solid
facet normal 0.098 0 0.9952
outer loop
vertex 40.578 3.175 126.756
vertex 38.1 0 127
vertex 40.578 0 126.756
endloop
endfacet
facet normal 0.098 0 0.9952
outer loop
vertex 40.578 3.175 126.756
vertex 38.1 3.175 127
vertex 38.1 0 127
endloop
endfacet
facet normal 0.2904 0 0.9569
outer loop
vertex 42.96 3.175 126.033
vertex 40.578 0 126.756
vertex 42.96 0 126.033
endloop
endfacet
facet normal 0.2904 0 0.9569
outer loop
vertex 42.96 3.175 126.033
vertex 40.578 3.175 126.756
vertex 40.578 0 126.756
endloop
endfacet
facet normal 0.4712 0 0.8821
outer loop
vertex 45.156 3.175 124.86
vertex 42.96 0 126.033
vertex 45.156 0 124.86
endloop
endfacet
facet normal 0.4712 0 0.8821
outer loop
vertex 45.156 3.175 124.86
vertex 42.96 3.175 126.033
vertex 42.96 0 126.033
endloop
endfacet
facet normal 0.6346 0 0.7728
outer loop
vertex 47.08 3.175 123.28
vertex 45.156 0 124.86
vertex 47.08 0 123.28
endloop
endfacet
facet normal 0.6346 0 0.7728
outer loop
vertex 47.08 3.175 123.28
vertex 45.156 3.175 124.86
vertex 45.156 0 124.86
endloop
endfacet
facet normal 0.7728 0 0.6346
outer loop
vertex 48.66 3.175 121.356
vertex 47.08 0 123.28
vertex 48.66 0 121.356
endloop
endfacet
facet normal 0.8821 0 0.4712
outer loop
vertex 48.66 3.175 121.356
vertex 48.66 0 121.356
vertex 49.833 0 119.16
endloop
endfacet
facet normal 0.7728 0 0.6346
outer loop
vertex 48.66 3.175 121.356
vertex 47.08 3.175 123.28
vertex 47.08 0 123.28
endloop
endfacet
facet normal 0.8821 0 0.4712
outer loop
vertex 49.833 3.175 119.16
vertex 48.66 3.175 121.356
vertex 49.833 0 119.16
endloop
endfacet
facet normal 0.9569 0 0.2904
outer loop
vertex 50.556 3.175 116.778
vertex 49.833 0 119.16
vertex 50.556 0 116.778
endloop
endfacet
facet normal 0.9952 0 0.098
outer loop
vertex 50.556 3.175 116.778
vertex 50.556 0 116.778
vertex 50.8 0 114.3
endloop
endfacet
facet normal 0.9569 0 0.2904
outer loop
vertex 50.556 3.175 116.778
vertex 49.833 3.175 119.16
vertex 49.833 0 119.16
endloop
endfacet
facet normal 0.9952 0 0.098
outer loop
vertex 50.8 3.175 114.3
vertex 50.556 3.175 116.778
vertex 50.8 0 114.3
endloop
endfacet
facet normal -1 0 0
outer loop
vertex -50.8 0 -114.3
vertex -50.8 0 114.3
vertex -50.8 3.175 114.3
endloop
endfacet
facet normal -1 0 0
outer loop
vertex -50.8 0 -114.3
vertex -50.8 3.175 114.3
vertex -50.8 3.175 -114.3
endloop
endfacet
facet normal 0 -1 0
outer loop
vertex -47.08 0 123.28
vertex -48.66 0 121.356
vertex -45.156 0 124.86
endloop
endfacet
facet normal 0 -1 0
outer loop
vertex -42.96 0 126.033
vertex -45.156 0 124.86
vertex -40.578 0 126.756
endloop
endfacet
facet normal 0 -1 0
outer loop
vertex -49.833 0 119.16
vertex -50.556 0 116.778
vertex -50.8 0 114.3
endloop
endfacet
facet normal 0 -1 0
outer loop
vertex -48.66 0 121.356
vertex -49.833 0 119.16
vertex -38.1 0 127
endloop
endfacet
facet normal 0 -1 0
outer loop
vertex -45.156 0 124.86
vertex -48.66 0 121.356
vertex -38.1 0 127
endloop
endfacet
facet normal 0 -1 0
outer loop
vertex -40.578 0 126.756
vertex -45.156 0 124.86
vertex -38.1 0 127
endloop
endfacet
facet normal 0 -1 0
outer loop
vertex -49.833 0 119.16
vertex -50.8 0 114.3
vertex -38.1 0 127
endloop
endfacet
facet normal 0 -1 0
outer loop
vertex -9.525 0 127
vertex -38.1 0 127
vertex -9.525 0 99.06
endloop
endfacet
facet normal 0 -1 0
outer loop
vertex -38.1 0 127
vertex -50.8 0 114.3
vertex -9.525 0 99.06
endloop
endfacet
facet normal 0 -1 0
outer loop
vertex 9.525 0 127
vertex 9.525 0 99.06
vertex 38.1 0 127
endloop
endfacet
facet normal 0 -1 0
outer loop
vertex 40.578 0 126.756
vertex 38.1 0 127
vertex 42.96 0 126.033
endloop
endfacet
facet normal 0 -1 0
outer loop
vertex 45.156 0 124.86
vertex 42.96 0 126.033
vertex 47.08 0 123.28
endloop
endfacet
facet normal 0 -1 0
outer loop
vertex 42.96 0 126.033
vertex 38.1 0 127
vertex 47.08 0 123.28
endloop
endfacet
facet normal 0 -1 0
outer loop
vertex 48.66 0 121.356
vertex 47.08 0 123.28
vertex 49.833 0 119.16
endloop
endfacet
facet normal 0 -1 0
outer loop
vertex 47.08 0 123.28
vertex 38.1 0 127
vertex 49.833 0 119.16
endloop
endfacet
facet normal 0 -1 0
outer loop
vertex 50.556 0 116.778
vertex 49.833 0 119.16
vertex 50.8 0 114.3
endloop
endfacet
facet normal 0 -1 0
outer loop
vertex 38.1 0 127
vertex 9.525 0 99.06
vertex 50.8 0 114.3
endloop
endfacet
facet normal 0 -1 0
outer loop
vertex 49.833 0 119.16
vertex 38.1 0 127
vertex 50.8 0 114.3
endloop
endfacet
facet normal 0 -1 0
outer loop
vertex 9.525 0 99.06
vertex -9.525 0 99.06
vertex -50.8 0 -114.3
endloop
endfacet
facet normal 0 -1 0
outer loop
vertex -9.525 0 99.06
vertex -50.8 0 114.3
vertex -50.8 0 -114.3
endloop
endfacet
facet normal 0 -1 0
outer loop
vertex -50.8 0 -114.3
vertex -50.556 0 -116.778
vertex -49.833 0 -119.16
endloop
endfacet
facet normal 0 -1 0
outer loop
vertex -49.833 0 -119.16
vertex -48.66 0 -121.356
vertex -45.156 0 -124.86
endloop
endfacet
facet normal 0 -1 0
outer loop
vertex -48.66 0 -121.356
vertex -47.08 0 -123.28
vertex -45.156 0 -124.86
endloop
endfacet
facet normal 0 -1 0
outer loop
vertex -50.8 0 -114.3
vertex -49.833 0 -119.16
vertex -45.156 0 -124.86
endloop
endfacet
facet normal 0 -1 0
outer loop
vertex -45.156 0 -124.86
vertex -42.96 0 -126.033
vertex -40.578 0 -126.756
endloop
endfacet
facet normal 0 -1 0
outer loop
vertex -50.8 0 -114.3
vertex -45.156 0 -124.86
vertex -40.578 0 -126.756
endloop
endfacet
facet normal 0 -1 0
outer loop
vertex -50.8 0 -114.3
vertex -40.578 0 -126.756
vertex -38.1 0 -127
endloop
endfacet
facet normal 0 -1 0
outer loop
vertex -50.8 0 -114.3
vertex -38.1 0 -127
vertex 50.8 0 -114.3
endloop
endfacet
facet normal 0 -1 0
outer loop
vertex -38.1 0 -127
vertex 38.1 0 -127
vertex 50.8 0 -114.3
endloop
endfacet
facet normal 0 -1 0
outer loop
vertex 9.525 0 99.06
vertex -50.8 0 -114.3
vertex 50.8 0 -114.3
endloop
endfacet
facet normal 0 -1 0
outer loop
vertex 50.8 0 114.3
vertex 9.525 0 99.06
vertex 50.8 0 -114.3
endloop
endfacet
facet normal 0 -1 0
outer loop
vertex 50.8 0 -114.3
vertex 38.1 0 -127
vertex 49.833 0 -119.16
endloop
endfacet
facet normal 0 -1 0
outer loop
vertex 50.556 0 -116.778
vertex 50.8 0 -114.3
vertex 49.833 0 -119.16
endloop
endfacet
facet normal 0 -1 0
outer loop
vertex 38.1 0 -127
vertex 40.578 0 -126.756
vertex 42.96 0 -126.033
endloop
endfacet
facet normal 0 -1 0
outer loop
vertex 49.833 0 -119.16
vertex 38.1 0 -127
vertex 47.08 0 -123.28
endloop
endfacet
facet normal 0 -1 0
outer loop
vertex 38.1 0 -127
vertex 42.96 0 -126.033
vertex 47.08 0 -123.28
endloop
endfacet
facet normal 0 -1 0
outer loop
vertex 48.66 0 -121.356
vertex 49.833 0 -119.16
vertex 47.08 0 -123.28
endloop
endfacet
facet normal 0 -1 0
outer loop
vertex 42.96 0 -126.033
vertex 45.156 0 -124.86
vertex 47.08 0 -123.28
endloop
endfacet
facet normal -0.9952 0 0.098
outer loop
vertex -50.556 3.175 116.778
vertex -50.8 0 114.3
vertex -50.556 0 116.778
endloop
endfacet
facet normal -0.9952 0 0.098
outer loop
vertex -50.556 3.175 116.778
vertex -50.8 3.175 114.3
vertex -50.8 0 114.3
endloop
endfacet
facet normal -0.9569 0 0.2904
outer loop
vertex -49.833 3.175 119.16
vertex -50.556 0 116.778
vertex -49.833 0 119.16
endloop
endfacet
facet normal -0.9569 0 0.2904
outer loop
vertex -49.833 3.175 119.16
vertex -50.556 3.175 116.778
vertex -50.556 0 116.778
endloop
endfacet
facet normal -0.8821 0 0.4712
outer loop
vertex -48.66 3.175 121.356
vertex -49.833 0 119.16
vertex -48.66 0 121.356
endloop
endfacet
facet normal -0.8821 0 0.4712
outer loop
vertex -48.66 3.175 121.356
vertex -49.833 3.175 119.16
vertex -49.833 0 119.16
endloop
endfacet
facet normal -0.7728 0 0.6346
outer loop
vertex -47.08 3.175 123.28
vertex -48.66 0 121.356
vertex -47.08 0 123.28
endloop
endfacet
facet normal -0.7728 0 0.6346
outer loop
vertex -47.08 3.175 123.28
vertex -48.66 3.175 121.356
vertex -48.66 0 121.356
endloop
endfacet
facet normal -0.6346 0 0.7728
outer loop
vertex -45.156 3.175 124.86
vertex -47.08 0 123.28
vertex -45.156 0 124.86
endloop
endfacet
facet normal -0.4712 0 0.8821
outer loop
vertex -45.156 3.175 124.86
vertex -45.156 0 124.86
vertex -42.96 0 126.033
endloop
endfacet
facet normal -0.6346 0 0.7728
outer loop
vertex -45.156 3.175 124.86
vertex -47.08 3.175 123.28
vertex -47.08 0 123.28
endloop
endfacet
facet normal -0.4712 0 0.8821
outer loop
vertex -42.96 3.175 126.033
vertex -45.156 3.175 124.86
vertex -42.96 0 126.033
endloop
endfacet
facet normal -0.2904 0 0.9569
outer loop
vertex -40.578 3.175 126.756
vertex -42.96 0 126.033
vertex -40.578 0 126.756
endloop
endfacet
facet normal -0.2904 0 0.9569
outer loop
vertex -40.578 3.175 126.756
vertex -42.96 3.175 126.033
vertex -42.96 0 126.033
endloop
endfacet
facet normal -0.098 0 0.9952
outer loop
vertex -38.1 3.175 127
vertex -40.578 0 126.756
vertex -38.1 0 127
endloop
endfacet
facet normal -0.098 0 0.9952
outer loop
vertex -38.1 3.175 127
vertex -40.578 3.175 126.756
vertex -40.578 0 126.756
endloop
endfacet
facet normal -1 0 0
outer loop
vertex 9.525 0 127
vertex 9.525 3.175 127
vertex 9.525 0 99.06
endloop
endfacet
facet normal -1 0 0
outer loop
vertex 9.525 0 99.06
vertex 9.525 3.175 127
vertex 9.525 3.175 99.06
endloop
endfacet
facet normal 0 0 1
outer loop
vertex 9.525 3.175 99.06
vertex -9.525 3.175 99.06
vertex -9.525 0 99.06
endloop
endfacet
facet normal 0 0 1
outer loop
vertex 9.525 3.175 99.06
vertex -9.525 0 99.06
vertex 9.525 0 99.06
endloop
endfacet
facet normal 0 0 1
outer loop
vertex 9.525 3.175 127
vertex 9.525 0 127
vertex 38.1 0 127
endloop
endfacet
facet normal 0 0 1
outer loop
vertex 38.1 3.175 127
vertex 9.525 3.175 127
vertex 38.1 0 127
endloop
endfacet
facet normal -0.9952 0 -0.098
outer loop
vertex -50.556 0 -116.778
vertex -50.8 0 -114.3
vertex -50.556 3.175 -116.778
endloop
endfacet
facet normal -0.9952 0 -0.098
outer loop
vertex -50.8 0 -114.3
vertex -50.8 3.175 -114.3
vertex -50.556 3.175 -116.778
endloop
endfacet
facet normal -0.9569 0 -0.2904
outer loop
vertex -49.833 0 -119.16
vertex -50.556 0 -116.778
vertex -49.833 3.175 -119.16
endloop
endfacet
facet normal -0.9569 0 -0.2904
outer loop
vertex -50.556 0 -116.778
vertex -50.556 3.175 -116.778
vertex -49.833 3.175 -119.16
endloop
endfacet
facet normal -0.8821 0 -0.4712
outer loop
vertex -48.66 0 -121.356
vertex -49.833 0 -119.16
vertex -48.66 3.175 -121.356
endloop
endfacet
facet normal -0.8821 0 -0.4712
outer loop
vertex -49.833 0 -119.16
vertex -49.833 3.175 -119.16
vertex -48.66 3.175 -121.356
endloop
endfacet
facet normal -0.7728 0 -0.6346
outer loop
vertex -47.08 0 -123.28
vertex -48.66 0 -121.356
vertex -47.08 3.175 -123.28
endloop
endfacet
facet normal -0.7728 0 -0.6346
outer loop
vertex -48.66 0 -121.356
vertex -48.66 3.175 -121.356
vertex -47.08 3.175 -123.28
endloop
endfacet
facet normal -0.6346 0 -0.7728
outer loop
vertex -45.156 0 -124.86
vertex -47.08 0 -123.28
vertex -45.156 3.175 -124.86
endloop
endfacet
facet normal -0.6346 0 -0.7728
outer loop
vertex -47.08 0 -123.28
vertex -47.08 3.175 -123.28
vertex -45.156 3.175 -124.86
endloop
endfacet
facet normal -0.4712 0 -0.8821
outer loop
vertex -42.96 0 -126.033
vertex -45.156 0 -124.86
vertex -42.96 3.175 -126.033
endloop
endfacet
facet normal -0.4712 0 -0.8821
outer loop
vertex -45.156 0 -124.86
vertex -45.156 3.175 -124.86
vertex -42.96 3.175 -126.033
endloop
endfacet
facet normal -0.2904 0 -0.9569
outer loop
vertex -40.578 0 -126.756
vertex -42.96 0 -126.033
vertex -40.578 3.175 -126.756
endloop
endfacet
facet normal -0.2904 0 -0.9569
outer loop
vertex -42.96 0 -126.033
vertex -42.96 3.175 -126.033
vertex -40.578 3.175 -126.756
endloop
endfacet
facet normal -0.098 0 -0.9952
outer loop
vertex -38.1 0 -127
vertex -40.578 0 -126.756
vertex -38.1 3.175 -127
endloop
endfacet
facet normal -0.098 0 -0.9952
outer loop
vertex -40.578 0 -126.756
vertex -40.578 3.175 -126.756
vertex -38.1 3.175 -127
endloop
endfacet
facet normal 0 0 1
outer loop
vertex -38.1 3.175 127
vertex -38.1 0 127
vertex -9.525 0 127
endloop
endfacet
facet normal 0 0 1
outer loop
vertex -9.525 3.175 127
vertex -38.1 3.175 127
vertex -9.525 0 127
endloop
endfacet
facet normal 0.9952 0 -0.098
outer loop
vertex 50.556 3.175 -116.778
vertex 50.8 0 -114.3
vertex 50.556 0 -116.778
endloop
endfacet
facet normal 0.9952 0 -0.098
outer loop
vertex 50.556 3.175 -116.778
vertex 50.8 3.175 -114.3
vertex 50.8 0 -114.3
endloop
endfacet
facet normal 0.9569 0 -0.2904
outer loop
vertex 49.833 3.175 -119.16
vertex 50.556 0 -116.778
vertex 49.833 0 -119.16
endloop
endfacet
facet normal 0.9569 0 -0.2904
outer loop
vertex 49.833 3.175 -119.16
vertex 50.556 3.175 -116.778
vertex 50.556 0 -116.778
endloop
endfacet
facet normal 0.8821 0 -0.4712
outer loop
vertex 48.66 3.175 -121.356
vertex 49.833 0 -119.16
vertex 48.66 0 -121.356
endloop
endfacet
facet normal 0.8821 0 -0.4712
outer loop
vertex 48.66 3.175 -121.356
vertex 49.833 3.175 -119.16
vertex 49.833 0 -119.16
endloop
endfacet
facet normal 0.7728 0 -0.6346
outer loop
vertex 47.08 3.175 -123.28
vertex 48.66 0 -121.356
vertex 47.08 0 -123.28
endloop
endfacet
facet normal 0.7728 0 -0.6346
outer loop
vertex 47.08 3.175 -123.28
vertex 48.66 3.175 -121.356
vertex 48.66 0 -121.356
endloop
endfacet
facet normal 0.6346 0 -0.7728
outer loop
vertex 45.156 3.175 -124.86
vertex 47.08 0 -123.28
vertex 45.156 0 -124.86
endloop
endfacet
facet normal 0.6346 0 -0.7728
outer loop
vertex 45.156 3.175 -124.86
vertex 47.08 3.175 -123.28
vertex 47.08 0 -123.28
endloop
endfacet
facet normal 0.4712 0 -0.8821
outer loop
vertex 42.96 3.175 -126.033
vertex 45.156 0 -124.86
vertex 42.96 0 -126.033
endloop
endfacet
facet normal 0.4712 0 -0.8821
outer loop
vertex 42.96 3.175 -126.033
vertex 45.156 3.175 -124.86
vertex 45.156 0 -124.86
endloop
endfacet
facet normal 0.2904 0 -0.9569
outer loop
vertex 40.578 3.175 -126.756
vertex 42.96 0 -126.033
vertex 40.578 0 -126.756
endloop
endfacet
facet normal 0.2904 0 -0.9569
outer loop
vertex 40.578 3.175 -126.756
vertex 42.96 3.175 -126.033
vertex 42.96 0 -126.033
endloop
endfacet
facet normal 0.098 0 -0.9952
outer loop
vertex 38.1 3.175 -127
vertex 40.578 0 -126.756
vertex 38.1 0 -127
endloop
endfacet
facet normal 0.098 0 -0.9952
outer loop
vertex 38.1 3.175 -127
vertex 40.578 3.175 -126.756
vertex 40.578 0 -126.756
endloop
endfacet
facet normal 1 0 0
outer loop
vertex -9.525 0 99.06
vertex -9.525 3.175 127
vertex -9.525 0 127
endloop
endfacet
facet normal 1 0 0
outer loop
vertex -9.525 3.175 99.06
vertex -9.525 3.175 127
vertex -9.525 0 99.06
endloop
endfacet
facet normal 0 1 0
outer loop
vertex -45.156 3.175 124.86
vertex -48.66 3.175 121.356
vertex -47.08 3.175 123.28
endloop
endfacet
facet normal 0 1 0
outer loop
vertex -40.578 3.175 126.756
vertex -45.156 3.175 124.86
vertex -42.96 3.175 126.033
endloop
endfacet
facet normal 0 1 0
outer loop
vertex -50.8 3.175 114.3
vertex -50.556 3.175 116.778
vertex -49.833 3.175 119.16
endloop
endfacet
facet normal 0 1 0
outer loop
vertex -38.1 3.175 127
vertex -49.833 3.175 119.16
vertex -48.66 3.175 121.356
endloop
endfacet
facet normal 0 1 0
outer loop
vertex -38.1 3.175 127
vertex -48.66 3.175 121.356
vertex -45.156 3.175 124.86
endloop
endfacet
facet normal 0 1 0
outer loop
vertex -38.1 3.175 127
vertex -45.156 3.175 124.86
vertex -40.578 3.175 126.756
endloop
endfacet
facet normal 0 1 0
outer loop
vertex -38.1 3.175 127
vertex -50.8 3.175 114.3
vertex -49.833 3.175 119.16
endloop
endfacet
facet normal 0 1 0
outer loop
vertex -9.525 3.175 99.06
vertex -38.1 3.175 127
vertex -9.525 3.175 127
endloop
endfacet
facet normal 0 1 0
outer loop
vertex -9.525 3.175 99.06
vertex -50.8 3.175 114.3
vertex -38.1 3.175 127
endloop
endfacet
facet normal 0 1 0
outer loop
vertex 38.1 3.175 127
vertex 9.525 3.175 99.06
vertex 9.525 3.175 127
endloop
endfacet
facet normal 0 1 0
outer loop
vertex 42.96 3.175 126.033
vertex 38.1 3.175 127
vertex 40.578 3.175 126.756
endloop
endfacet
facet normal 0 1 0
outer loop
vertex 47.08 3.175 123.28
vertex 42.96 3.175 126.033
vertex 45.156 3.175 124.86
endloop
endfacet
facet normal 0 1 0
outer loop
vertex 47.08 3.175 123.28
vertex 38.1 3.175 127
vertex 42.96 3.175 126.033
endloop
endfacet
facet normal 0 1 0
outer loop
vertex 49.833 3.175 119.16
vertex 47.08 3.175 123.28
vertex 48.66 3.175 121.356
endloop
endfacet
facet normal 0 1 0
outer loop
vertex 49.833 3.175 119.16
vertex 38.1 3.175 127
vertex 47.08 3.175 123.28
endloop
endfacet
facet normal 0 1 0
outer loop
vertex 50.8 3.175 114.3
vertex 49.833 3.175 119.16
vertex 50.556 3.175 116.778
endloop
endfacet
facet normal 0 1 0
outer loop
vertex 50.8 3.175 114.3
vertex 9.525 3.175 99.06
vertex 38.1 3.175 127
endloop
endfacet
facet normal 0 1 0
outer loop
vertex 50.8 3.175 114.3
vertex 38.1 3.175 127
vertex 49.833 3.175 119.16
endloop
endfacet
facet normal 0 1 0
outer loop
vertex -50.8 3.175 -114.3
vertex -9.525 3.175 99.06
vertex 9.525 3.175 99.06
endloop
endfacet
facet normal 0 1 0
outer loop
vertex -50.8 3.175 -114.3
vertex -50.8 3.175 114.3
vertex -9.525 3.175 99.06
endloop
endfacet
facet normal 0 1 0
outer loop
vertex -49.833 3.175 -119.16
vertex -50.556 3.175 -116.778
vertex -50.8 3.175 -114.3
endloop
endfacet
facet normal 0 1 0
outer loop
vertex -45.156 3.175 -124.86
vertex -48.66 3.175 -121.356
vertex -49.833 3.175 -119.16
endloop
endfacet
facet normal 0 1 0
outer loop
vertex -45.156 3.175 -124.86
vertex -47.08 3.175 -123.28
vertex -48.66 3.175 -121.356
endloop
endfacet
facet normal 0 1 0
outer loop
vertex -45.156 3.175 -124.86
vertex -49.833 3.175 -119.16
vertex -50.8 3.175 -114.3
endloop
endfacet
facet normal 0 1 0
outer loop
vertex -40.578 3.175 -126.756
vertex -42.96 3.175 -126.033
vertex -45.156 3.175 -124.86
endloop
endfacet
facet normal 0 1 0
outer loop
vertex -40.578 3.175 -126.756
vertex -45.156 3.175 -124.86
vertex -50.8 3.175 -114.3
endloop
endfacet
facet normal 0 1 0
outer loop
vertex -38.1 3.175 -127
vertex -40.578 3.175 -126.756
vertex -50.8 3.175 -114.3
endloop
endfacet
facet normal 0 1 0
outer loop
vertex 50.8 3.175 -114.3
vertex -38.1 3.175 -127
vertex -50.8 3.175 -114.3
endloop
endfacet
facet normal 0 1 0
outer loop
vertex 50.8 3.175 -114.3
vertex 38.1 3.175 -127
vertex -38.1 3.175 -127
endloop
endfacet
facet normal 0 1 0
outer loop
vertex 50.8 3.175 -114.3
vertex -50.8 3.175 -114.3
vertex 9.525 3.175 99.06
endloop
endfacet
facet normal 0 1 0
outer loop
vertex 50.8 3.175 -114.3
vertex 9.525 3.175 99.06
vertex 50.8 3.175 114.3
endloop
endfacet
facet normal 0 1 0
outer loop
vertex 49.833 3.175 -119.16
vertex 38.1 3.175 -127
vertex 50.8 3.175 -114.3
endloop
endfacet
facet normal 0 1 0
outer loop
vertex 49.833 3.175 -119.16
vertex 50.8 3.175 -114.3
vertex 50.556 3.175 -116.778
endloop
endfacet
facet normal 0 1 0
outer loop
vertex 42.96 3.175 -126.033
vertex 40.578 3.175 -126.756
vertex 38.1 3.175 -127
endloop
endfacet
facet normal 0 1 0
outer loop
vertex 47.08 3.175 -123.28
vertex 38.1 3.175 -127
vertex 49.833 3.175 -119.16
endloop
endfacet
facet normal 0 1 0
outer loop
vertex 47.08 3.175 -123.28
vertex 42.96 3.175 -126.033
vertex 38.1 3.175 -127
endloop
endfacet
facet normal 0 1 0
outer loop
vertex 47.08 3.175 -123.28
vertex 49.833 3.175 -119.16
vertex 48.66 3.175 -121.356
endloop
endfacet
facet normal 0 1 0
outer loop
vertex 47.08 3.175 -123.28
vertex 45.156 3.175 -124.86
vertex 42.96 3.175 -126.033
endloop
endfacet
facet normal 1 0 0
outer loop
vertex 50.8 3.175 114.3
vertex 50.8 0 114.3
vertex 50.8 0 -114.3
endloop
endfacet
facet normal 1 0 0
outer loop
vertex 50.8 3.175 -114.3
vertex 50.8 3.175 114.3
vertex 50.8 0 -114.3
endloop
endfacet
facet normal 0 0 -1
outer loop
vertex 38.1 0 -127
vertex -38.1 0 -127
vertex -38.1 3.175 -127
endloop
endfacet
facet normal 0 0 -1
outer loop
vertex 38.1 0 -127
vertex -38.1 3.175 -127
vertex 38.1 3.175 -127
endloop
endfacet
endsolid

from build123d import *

# Parameters (mm, degrees)
SKETCH1_W           = 101.6
SKETCH1_H           = 254
BOSS_EXTRUDE1_DEPTH = 3.175
FILLET1_R           = 12.7
SKETCH2_W           = 19.05
SKETCH2_H           = 27.94
CUT_EXTRUDE1_DEPTH  = 137.820030058


with BuildPart() as part:
    # Sketch1 → Boss-Extrude1 (new body)
    with BuildSketch(Plane(origin=(0, 0, 0), x_dir=(1, 0, 0), z_dir=(0, 1, 0))):
        Rectangle(SKETCH1_W, SKETCH1_H)
    extrude(amount=BOSS_EXTRUDE1_DEPTH)

    # Fillet1
    fillet1_edges = [part.edges().sort_by_distance(p)[0] for p in [
        (-50.8, 1.5875, -127),
        (50.8, 1.5875, -127),
        (50.8, 1.5875, 127),
        (-50.8, 1.5875, 127),
    ]]
    fillet(fillet1_edges, radius=FILLET1_R)

    # Sketch2 → Cut-Extrude1 (cut, through all)
    with BuildSketch(Plane(origin=(0, 3.175, 0), x_dir=(1, 0, 0), z_dir=(0, 1, 0))):
        with Locations((0, -113.03)):
            Rectangle(SKETCH2_W, SKETCH2_H)
    extrude(amount=-CUT_EXTRUDE1_DEPTH, mode=Mode.SUBTRACT)


solid = part.part
